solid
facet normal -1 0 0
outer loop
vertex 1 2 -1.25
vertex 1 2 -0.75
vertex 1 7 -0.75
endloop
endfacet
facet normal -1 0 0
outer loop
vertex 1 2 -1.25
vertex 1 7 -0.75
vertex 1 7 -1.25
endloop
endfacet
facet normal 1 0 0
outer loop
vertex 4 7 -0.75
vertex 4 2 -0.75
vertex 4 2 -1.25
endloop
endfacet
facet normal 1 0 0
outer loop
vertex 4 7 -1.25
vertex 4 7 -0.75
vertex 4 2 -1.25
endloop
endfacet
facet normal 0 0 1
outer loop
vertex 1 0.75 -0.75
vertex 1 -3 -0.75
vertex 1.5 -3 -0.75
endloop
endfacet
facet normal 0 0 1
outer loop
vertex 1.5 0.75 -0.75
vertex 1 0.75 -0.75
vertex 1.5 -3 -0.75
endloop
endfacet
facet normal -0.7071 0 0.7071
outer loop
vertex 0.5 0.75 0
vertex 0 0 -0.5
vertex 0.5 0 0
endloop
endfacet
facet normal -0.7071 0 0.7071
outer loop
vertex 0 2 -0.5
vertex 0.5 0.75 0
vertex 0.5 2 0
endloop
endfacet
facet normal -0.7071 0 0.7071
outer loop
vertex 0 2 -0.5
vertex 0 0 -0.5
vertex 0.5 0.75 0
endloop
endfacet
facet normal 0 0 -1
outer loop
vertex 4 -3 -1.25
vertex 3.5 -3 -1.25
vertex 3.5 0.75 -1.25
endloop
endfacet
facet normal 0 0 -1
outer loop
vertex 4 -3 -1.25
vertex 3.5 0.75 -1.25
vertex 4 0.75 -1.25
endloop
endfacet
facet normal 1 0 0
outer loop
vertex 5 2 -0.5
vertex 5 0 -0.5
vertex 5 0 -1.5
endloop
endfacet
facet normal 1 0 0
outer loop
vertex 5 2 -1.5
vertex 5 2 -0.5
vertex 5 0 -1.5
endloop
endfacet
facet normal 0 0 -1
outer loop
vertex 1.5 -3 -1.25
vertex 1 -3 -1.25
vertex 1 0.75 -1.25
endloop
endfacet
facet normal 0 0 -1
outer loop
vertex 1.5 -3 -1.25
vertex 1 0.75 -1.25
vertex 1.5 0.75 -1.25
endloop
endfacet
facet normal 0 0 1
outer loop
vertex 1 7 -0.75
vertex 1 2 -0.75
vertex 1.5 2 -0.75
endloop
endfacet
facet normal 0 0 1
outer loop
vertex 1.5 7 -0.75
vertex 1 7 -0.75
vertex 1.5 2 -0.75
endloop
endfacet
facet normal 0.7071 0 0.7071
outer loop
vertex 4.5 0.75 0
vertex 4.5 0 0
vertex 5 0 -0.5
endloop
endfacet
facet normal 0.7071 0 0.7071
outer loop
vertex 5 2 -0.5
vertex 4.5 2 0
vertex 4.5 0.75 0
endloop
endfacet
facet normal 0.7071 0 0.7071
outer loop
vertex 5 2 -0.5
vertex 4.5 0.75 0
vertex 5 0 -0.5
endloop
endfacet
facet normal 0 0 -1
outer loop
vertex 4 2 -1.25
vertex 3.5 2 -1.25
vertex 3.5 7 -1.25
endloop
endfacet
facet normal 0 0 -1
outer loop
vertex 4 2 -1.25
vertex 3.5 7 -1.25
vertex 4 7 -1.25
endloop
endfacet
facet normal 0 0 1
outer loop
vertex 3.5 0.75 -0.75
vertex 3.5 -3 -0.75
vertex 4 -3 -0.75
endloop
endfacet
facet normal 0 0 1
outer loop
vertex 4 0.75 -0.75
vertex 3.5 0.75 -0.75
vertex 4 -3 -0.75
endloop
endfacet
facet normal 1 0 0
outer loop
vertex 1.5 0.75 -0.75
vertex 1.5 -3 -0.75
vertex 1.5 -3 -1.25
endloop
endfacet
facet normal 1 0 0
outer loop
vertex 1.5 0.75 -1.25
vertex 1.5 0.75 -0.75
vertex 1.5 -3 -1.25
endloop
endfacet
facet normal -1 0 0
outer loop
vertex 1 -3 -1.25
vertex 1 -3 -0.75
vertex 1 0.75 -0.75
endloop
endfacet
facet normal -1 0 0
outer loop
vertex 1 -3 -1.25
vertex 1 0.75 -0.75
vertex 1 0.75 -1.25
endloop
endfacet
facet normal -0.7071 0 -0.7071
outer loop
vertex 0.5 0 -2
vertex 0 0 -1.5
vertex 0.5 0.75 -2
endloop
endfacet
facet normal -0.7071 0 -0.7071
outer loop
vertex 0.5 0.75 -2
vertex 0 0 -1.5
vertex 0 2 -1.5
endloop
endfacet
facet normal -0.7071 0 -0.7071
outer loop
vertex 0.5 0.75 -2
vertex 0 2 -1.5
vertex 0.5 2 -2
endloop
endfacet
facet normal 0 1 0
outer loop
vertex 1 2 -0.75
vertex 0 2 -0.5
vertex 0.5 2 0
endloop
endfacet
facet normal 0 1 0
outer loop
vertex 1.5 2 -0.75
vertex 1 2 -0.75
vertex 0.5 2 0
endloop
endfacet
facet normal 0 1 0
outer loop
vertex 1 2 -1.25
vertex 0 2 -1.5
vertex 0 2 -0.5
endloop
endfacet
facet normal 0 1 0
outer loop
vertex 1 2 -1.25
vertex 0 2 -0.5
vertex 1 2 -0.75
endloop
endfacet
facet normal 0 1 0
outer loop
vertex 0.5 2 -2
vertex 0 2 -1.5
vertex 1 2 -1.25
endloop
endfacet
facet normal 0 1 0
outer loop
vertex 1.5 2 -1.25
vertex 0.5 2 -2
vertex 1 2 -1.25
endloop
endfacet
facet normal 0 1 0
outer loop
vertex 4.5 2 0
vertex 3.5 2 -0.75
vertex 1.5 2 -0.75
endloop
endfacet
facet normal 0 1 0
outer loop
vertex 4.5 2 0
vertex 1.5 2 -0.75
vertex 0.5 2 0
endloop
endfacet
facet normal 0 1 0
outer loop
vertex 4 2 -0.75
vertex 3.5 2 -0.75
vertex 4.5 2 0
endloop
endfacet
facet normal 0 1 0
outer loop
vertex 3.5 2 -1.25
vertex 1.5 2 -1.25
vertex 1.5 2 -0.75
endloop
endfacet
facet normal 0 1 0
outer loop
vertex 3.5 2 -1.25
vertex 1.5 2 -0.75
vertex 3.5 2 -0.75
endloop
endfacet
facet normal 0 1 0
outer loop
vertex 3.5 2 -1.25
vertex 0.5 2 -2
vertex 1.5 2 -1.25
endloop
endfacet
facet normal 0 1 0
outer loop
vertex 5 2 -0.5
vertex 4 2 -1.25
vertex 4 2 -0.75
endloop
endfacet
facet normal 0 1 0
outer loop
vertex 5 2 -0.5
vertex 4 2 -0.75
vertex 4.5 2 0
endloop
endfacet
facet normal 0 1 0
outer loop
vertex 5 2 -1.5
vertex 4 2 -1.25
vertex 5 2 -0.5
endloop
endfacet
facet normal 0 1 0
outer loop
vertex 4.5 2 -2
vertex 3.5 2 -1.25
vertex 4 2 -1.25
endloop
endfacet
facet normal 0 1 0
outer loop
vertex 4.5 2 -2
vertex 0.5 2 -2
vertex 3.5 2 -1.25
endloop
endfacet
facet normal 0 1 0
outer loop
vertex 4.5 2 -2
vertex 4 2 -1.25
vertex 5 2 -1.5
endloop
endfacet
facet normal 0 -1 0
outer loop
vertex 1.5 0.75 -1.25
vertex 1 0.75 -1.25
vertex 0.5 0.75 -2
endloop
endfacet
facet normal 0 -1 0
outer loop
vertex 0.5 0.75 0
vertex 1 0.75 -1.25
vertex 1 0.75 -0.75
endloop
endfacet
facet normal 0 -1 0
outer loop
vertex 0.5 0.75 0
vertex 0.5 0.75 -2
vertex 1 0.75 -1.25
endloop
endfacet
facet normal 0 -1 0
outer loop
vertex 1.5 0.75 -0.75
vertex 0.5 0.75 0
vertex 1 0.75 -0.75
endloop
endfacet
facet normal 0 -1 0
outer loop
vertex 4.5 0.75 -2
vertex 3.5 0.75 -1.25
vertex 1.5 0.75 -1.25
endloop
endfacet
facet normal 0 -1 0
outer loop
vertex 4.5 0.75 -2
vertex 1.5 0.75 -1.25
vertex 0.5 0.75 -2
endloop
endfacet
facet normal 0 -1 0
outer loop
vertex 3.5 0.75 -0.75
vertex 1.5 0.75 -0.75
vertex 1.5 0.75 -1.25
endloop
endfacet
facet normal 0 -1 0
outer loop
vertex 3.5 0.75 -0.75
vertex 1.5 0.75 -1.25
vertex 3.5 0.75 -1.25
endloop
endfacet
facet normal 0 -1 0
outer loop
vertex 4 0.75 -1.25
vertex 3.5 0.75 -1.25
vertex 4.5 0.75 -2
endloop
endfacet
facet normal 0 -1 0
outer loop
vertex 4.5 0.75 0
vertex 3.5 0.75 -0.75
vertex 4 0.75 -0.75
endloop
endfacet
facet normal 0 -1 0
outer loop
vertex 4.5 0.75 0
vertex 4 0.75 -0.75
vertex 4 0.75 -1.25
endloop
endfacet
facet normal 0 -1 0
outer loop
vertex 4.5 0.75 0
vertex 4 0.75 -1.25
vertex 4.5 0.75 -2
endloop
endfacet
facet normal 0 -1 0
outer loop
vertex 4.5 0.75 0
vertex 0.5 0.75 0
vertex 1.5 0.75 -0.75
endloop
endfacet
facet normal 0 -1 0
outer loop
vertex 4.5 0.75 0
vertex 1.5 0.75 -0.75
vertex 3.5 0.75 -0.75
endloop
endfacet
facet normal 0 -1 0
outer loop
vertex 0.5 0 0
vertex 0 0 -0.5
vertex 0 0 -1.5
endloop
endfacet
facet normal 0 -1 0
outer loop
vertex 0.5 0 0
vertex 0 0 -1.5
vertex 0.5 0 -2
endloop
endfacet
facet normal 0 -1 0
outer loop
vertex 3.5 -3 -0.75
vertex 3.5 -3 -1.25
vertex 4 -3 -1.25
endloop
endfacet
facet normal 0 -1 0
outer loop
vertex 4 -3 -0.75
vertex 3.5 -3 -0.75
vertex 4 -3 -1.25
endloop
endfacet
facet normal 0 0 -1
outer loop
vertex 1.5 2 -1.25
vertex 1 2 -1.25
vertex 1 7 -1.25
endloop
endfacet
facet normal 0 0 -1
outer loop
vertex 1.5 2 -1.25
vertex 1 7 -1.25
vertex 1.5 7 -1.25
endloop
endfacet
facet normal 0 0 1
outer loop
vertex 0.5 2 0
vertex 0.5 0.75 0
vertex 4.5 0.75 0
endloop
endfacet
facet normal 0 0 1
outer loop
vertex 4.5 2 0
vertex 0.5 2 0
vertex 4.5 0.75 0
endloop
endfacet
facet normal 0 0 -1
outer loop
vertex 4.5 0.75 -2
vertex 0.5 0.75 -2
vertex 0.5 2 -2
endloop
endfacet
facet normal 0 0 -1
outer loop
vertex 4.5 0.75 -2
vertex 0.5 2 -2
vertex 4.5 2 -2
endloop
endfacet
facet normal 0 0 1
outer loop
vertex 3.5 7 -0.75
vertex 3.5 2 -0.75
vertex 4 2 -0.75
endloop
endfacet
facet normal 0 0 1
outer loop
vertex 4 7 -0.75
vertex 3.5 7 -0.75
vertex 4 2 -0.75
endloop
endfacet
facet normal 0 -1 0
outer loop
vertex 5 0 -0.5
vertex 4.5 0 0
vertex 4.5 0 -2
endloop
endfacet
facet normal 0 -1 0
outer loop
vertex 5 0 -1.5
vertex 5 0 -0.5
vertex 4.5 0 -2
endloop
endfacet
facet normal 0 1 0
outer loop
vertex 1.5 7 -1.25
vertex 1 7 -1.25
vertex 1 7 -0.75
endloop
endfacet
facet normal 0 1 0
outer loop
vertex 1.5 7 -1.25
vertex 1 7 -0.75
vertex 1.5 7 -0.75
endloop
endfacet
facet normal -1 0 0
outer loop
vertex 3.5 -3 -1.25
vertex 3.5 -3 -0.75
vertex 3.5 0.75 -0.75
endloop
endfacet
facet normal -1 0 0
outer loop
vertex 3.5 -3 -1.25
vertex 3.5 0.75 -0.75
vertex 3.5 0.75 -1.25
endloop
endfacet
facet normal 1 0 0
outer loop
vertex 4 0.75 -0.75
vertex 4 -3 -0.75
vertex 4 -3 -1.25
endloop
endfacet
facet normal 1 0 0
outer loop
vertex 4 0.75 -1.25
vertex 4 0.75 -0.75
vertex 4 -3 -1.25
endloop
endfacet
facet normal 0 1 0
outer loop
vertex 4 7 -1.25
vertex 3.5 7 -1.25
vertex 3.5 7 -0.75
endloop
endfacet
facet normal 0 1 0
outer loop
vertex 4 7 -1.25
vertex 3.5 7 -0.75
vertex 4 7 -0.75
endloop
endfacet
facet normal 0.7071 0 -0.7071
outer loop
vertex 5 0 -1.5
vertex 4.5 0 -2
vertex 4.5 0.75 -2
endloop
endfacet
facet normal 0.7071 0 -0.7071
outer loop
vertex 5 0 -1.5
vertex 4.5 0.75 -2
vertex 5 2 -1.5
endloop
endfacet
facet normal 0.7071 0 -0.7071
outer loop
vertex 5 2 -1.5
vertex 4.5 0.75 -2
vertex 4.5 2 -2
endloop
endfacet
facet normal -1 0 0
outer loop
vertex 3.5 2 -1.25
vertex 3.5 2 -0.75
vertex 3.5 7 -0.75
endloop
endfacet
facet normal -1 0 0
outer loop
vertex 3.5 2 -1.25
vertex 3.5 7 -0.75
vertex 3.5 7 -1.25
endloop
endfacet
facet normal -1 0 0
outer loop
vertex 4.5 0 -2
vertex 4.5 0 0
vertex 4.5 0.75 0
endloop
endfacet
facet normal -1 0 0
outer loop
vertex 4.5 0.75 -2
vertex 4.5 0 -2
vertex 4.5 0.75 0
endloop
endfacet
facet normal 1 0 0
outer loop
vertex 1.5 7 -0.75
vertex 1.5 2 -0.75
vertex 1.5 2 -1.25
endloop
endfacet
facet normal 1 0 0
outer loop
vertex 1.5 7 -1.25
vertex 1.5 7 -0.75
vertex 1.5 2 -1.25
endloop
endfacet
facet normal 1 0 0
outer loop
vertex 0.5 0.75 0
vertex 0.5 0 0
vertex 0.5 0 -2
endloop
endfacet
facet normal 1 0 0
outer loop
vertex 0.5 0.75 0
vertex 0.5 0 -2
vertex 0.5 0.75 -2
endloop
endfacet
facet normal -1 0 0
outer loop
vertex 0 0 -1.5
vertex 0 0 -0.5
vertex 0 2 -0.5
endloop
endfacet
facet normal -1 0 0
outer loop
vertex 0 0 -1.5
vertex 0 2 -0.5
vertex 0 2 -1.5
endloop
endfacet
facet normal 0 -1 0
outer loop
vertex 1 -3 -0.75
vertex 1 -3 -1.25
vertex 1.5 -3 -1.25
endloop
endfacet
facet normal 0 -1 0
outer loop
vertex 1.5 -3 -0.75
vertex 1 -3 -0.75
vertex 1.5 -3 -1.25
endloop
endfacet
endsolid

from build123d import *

# Parameters (mm, degrees)
SKETCH1_W                = 5
SKETCH1_H                = 2
BOSS_EXTRUDE1_DEPTH      = 2
SKETCH2_W                = 4
SKETCH2_H                = 0.75
CUT_EXTRUDE1_DEPTH       = 6.744562647
CHAMFER1_START           = -1.060660172
CHAMFER1_OUTLINE_W       = 1.403805922
CHAMFER1_OUTLINE_H       = 3
CHAMFER1_OUTLINE_W_2     = 1.353553391
CHAMFER1_DEPTH           = 4.242640687
CHAMFER1_START_2         = 3.181980515
CHAMFER1_2_OUTLINE_W     = 4.242640687
CHAMFER1_2_OUTLINE_H     = 3
CHAMFER1_2_DEPTH         = 1.818019485
CHAMFER1_START_3         = -1.414213562
CHAMFER1_3_OUTLINE_W     = 4.242640687
CHAMFER1_3_OUTLINE_H     = 3
CHAMFER1_3_DEPTH         = 0.35355339
BOSS_EXTRUDE2_DEPTH      = 5
BOSS_EXTRUDE2_DEPTH_BACK = 5
SKETCH3_W                = 0.5
SKETCH3_H                = 0.5


with BuildPart() as part:
    # Sketch1 → Boss-Extrude1 (new body)
    with BuildSketch(Plane(origin=(0, 0, 0), x_dir=(1, 0, 0), z_dir=(0, 1, 0))):
        with Locations((2.5, 1)):
            Rectangle(SKETCH1_W, SKETCH1_H)
    extrude(amount=BOSS_EXTRUDE1_DEPTH)

    # Sketch2 → Cut-Extrude1 (cut, through all)
    with BuildSketch(Plane.XY):
        with Locations((2.5, 0.375)):
            Rectangle(SKETCH2_W, SKETCH2_H)
    extrude(amount=-CUT_EXTRUDE1_DEPTH, mode=Mode.SUBTRACT)

    # Chamfer1: read off the stored shape, not the designer's step
    # Chamfer1 outline → Chamfer1 (cut)
    with BuildSketch(Plane(origin=(0, 0, 0), x_dir=(0.707106781186549, 0, -0.707106781186546), z_dir=(0.707106781186546, 0, 0.707106781186549)).offset(CHAMFER1_START)):
        with Locations((5.298097039, 1.5)):
            Rectangle(CHAMFER1_OUTLINE_W, CHAMFER1_OUTLINE_H)
        with Locations((-0.323223305, 1.5)):
            Rectangle(CHAMFER1_OUTLINE_W_2, CHAMFER1_OUTLINE_H)
    extrude(amount=CHAMFER1_DEPTH, mode=Mode.SUBTRACT)

    # Chamfer1 2 outline → Chamfer1 2 (cut)
    with BuildSketch(Plane(origin=(0, 0, 0), x_dir=(0.707106781186549, 0, -0.707106781186546), z_dir=(0.707106781186546, 0, 0.707106781186549)).offset(CHAMFER1_START_2)):
        with Locations((2.474873735, 1.5)):
            Rectangle(CHAMFER1_2_OUTLINE_W, CHAMFER1_2_OUTLINE_H)
    extrude(amount=CHAMFER1_2_DEPTH, mode=Mode.SUBTRACT)

    # Chamfer1 3 outline → Chamfer1 3 (cut)
    with BuildSketch(Plane(origin=(0, 0, 0), x_dir=(0.707106781186549, 0, -0.707106781186546), z_dir=(0.707106781186546, 0, 0.707106781186549)).offset(CHAMFER1_START_3)):
        with Locations((2.474873735, 1.5)):
            Rectangle(CHAMFER1_3_OUTLINE_W, CHAMFER1_3_OUTLINE_H)
    extrude(amount=CHAMFER1_3_DEPTH, mode=Mode.SUBTRACT)

    # Sketch3 → Boss-Extrude2 (add, two sides: drawn at the far end of the back side and taken through both)
    with BuildSketch(Plane(origin=(0, 2, 0), x_dir=(1, 0, 0), z_dir=(0, 1, 0)).offset(-BOSS_EXTRUDE2_DEPTH_BACK)):
        with Locations((1.25, 1)):
            Rectangle(SKETCH3_W, SKETCH3_H)
        with Locations((3.75, 1)):
            Rectangle(SKETCH3_W, SKETCH3_H)
    extrude(amount=BOSS_EXTRUDE2_DEPTH + BOSS_EXTRUDE2_DEPTH_BACK)


solid = part.part
